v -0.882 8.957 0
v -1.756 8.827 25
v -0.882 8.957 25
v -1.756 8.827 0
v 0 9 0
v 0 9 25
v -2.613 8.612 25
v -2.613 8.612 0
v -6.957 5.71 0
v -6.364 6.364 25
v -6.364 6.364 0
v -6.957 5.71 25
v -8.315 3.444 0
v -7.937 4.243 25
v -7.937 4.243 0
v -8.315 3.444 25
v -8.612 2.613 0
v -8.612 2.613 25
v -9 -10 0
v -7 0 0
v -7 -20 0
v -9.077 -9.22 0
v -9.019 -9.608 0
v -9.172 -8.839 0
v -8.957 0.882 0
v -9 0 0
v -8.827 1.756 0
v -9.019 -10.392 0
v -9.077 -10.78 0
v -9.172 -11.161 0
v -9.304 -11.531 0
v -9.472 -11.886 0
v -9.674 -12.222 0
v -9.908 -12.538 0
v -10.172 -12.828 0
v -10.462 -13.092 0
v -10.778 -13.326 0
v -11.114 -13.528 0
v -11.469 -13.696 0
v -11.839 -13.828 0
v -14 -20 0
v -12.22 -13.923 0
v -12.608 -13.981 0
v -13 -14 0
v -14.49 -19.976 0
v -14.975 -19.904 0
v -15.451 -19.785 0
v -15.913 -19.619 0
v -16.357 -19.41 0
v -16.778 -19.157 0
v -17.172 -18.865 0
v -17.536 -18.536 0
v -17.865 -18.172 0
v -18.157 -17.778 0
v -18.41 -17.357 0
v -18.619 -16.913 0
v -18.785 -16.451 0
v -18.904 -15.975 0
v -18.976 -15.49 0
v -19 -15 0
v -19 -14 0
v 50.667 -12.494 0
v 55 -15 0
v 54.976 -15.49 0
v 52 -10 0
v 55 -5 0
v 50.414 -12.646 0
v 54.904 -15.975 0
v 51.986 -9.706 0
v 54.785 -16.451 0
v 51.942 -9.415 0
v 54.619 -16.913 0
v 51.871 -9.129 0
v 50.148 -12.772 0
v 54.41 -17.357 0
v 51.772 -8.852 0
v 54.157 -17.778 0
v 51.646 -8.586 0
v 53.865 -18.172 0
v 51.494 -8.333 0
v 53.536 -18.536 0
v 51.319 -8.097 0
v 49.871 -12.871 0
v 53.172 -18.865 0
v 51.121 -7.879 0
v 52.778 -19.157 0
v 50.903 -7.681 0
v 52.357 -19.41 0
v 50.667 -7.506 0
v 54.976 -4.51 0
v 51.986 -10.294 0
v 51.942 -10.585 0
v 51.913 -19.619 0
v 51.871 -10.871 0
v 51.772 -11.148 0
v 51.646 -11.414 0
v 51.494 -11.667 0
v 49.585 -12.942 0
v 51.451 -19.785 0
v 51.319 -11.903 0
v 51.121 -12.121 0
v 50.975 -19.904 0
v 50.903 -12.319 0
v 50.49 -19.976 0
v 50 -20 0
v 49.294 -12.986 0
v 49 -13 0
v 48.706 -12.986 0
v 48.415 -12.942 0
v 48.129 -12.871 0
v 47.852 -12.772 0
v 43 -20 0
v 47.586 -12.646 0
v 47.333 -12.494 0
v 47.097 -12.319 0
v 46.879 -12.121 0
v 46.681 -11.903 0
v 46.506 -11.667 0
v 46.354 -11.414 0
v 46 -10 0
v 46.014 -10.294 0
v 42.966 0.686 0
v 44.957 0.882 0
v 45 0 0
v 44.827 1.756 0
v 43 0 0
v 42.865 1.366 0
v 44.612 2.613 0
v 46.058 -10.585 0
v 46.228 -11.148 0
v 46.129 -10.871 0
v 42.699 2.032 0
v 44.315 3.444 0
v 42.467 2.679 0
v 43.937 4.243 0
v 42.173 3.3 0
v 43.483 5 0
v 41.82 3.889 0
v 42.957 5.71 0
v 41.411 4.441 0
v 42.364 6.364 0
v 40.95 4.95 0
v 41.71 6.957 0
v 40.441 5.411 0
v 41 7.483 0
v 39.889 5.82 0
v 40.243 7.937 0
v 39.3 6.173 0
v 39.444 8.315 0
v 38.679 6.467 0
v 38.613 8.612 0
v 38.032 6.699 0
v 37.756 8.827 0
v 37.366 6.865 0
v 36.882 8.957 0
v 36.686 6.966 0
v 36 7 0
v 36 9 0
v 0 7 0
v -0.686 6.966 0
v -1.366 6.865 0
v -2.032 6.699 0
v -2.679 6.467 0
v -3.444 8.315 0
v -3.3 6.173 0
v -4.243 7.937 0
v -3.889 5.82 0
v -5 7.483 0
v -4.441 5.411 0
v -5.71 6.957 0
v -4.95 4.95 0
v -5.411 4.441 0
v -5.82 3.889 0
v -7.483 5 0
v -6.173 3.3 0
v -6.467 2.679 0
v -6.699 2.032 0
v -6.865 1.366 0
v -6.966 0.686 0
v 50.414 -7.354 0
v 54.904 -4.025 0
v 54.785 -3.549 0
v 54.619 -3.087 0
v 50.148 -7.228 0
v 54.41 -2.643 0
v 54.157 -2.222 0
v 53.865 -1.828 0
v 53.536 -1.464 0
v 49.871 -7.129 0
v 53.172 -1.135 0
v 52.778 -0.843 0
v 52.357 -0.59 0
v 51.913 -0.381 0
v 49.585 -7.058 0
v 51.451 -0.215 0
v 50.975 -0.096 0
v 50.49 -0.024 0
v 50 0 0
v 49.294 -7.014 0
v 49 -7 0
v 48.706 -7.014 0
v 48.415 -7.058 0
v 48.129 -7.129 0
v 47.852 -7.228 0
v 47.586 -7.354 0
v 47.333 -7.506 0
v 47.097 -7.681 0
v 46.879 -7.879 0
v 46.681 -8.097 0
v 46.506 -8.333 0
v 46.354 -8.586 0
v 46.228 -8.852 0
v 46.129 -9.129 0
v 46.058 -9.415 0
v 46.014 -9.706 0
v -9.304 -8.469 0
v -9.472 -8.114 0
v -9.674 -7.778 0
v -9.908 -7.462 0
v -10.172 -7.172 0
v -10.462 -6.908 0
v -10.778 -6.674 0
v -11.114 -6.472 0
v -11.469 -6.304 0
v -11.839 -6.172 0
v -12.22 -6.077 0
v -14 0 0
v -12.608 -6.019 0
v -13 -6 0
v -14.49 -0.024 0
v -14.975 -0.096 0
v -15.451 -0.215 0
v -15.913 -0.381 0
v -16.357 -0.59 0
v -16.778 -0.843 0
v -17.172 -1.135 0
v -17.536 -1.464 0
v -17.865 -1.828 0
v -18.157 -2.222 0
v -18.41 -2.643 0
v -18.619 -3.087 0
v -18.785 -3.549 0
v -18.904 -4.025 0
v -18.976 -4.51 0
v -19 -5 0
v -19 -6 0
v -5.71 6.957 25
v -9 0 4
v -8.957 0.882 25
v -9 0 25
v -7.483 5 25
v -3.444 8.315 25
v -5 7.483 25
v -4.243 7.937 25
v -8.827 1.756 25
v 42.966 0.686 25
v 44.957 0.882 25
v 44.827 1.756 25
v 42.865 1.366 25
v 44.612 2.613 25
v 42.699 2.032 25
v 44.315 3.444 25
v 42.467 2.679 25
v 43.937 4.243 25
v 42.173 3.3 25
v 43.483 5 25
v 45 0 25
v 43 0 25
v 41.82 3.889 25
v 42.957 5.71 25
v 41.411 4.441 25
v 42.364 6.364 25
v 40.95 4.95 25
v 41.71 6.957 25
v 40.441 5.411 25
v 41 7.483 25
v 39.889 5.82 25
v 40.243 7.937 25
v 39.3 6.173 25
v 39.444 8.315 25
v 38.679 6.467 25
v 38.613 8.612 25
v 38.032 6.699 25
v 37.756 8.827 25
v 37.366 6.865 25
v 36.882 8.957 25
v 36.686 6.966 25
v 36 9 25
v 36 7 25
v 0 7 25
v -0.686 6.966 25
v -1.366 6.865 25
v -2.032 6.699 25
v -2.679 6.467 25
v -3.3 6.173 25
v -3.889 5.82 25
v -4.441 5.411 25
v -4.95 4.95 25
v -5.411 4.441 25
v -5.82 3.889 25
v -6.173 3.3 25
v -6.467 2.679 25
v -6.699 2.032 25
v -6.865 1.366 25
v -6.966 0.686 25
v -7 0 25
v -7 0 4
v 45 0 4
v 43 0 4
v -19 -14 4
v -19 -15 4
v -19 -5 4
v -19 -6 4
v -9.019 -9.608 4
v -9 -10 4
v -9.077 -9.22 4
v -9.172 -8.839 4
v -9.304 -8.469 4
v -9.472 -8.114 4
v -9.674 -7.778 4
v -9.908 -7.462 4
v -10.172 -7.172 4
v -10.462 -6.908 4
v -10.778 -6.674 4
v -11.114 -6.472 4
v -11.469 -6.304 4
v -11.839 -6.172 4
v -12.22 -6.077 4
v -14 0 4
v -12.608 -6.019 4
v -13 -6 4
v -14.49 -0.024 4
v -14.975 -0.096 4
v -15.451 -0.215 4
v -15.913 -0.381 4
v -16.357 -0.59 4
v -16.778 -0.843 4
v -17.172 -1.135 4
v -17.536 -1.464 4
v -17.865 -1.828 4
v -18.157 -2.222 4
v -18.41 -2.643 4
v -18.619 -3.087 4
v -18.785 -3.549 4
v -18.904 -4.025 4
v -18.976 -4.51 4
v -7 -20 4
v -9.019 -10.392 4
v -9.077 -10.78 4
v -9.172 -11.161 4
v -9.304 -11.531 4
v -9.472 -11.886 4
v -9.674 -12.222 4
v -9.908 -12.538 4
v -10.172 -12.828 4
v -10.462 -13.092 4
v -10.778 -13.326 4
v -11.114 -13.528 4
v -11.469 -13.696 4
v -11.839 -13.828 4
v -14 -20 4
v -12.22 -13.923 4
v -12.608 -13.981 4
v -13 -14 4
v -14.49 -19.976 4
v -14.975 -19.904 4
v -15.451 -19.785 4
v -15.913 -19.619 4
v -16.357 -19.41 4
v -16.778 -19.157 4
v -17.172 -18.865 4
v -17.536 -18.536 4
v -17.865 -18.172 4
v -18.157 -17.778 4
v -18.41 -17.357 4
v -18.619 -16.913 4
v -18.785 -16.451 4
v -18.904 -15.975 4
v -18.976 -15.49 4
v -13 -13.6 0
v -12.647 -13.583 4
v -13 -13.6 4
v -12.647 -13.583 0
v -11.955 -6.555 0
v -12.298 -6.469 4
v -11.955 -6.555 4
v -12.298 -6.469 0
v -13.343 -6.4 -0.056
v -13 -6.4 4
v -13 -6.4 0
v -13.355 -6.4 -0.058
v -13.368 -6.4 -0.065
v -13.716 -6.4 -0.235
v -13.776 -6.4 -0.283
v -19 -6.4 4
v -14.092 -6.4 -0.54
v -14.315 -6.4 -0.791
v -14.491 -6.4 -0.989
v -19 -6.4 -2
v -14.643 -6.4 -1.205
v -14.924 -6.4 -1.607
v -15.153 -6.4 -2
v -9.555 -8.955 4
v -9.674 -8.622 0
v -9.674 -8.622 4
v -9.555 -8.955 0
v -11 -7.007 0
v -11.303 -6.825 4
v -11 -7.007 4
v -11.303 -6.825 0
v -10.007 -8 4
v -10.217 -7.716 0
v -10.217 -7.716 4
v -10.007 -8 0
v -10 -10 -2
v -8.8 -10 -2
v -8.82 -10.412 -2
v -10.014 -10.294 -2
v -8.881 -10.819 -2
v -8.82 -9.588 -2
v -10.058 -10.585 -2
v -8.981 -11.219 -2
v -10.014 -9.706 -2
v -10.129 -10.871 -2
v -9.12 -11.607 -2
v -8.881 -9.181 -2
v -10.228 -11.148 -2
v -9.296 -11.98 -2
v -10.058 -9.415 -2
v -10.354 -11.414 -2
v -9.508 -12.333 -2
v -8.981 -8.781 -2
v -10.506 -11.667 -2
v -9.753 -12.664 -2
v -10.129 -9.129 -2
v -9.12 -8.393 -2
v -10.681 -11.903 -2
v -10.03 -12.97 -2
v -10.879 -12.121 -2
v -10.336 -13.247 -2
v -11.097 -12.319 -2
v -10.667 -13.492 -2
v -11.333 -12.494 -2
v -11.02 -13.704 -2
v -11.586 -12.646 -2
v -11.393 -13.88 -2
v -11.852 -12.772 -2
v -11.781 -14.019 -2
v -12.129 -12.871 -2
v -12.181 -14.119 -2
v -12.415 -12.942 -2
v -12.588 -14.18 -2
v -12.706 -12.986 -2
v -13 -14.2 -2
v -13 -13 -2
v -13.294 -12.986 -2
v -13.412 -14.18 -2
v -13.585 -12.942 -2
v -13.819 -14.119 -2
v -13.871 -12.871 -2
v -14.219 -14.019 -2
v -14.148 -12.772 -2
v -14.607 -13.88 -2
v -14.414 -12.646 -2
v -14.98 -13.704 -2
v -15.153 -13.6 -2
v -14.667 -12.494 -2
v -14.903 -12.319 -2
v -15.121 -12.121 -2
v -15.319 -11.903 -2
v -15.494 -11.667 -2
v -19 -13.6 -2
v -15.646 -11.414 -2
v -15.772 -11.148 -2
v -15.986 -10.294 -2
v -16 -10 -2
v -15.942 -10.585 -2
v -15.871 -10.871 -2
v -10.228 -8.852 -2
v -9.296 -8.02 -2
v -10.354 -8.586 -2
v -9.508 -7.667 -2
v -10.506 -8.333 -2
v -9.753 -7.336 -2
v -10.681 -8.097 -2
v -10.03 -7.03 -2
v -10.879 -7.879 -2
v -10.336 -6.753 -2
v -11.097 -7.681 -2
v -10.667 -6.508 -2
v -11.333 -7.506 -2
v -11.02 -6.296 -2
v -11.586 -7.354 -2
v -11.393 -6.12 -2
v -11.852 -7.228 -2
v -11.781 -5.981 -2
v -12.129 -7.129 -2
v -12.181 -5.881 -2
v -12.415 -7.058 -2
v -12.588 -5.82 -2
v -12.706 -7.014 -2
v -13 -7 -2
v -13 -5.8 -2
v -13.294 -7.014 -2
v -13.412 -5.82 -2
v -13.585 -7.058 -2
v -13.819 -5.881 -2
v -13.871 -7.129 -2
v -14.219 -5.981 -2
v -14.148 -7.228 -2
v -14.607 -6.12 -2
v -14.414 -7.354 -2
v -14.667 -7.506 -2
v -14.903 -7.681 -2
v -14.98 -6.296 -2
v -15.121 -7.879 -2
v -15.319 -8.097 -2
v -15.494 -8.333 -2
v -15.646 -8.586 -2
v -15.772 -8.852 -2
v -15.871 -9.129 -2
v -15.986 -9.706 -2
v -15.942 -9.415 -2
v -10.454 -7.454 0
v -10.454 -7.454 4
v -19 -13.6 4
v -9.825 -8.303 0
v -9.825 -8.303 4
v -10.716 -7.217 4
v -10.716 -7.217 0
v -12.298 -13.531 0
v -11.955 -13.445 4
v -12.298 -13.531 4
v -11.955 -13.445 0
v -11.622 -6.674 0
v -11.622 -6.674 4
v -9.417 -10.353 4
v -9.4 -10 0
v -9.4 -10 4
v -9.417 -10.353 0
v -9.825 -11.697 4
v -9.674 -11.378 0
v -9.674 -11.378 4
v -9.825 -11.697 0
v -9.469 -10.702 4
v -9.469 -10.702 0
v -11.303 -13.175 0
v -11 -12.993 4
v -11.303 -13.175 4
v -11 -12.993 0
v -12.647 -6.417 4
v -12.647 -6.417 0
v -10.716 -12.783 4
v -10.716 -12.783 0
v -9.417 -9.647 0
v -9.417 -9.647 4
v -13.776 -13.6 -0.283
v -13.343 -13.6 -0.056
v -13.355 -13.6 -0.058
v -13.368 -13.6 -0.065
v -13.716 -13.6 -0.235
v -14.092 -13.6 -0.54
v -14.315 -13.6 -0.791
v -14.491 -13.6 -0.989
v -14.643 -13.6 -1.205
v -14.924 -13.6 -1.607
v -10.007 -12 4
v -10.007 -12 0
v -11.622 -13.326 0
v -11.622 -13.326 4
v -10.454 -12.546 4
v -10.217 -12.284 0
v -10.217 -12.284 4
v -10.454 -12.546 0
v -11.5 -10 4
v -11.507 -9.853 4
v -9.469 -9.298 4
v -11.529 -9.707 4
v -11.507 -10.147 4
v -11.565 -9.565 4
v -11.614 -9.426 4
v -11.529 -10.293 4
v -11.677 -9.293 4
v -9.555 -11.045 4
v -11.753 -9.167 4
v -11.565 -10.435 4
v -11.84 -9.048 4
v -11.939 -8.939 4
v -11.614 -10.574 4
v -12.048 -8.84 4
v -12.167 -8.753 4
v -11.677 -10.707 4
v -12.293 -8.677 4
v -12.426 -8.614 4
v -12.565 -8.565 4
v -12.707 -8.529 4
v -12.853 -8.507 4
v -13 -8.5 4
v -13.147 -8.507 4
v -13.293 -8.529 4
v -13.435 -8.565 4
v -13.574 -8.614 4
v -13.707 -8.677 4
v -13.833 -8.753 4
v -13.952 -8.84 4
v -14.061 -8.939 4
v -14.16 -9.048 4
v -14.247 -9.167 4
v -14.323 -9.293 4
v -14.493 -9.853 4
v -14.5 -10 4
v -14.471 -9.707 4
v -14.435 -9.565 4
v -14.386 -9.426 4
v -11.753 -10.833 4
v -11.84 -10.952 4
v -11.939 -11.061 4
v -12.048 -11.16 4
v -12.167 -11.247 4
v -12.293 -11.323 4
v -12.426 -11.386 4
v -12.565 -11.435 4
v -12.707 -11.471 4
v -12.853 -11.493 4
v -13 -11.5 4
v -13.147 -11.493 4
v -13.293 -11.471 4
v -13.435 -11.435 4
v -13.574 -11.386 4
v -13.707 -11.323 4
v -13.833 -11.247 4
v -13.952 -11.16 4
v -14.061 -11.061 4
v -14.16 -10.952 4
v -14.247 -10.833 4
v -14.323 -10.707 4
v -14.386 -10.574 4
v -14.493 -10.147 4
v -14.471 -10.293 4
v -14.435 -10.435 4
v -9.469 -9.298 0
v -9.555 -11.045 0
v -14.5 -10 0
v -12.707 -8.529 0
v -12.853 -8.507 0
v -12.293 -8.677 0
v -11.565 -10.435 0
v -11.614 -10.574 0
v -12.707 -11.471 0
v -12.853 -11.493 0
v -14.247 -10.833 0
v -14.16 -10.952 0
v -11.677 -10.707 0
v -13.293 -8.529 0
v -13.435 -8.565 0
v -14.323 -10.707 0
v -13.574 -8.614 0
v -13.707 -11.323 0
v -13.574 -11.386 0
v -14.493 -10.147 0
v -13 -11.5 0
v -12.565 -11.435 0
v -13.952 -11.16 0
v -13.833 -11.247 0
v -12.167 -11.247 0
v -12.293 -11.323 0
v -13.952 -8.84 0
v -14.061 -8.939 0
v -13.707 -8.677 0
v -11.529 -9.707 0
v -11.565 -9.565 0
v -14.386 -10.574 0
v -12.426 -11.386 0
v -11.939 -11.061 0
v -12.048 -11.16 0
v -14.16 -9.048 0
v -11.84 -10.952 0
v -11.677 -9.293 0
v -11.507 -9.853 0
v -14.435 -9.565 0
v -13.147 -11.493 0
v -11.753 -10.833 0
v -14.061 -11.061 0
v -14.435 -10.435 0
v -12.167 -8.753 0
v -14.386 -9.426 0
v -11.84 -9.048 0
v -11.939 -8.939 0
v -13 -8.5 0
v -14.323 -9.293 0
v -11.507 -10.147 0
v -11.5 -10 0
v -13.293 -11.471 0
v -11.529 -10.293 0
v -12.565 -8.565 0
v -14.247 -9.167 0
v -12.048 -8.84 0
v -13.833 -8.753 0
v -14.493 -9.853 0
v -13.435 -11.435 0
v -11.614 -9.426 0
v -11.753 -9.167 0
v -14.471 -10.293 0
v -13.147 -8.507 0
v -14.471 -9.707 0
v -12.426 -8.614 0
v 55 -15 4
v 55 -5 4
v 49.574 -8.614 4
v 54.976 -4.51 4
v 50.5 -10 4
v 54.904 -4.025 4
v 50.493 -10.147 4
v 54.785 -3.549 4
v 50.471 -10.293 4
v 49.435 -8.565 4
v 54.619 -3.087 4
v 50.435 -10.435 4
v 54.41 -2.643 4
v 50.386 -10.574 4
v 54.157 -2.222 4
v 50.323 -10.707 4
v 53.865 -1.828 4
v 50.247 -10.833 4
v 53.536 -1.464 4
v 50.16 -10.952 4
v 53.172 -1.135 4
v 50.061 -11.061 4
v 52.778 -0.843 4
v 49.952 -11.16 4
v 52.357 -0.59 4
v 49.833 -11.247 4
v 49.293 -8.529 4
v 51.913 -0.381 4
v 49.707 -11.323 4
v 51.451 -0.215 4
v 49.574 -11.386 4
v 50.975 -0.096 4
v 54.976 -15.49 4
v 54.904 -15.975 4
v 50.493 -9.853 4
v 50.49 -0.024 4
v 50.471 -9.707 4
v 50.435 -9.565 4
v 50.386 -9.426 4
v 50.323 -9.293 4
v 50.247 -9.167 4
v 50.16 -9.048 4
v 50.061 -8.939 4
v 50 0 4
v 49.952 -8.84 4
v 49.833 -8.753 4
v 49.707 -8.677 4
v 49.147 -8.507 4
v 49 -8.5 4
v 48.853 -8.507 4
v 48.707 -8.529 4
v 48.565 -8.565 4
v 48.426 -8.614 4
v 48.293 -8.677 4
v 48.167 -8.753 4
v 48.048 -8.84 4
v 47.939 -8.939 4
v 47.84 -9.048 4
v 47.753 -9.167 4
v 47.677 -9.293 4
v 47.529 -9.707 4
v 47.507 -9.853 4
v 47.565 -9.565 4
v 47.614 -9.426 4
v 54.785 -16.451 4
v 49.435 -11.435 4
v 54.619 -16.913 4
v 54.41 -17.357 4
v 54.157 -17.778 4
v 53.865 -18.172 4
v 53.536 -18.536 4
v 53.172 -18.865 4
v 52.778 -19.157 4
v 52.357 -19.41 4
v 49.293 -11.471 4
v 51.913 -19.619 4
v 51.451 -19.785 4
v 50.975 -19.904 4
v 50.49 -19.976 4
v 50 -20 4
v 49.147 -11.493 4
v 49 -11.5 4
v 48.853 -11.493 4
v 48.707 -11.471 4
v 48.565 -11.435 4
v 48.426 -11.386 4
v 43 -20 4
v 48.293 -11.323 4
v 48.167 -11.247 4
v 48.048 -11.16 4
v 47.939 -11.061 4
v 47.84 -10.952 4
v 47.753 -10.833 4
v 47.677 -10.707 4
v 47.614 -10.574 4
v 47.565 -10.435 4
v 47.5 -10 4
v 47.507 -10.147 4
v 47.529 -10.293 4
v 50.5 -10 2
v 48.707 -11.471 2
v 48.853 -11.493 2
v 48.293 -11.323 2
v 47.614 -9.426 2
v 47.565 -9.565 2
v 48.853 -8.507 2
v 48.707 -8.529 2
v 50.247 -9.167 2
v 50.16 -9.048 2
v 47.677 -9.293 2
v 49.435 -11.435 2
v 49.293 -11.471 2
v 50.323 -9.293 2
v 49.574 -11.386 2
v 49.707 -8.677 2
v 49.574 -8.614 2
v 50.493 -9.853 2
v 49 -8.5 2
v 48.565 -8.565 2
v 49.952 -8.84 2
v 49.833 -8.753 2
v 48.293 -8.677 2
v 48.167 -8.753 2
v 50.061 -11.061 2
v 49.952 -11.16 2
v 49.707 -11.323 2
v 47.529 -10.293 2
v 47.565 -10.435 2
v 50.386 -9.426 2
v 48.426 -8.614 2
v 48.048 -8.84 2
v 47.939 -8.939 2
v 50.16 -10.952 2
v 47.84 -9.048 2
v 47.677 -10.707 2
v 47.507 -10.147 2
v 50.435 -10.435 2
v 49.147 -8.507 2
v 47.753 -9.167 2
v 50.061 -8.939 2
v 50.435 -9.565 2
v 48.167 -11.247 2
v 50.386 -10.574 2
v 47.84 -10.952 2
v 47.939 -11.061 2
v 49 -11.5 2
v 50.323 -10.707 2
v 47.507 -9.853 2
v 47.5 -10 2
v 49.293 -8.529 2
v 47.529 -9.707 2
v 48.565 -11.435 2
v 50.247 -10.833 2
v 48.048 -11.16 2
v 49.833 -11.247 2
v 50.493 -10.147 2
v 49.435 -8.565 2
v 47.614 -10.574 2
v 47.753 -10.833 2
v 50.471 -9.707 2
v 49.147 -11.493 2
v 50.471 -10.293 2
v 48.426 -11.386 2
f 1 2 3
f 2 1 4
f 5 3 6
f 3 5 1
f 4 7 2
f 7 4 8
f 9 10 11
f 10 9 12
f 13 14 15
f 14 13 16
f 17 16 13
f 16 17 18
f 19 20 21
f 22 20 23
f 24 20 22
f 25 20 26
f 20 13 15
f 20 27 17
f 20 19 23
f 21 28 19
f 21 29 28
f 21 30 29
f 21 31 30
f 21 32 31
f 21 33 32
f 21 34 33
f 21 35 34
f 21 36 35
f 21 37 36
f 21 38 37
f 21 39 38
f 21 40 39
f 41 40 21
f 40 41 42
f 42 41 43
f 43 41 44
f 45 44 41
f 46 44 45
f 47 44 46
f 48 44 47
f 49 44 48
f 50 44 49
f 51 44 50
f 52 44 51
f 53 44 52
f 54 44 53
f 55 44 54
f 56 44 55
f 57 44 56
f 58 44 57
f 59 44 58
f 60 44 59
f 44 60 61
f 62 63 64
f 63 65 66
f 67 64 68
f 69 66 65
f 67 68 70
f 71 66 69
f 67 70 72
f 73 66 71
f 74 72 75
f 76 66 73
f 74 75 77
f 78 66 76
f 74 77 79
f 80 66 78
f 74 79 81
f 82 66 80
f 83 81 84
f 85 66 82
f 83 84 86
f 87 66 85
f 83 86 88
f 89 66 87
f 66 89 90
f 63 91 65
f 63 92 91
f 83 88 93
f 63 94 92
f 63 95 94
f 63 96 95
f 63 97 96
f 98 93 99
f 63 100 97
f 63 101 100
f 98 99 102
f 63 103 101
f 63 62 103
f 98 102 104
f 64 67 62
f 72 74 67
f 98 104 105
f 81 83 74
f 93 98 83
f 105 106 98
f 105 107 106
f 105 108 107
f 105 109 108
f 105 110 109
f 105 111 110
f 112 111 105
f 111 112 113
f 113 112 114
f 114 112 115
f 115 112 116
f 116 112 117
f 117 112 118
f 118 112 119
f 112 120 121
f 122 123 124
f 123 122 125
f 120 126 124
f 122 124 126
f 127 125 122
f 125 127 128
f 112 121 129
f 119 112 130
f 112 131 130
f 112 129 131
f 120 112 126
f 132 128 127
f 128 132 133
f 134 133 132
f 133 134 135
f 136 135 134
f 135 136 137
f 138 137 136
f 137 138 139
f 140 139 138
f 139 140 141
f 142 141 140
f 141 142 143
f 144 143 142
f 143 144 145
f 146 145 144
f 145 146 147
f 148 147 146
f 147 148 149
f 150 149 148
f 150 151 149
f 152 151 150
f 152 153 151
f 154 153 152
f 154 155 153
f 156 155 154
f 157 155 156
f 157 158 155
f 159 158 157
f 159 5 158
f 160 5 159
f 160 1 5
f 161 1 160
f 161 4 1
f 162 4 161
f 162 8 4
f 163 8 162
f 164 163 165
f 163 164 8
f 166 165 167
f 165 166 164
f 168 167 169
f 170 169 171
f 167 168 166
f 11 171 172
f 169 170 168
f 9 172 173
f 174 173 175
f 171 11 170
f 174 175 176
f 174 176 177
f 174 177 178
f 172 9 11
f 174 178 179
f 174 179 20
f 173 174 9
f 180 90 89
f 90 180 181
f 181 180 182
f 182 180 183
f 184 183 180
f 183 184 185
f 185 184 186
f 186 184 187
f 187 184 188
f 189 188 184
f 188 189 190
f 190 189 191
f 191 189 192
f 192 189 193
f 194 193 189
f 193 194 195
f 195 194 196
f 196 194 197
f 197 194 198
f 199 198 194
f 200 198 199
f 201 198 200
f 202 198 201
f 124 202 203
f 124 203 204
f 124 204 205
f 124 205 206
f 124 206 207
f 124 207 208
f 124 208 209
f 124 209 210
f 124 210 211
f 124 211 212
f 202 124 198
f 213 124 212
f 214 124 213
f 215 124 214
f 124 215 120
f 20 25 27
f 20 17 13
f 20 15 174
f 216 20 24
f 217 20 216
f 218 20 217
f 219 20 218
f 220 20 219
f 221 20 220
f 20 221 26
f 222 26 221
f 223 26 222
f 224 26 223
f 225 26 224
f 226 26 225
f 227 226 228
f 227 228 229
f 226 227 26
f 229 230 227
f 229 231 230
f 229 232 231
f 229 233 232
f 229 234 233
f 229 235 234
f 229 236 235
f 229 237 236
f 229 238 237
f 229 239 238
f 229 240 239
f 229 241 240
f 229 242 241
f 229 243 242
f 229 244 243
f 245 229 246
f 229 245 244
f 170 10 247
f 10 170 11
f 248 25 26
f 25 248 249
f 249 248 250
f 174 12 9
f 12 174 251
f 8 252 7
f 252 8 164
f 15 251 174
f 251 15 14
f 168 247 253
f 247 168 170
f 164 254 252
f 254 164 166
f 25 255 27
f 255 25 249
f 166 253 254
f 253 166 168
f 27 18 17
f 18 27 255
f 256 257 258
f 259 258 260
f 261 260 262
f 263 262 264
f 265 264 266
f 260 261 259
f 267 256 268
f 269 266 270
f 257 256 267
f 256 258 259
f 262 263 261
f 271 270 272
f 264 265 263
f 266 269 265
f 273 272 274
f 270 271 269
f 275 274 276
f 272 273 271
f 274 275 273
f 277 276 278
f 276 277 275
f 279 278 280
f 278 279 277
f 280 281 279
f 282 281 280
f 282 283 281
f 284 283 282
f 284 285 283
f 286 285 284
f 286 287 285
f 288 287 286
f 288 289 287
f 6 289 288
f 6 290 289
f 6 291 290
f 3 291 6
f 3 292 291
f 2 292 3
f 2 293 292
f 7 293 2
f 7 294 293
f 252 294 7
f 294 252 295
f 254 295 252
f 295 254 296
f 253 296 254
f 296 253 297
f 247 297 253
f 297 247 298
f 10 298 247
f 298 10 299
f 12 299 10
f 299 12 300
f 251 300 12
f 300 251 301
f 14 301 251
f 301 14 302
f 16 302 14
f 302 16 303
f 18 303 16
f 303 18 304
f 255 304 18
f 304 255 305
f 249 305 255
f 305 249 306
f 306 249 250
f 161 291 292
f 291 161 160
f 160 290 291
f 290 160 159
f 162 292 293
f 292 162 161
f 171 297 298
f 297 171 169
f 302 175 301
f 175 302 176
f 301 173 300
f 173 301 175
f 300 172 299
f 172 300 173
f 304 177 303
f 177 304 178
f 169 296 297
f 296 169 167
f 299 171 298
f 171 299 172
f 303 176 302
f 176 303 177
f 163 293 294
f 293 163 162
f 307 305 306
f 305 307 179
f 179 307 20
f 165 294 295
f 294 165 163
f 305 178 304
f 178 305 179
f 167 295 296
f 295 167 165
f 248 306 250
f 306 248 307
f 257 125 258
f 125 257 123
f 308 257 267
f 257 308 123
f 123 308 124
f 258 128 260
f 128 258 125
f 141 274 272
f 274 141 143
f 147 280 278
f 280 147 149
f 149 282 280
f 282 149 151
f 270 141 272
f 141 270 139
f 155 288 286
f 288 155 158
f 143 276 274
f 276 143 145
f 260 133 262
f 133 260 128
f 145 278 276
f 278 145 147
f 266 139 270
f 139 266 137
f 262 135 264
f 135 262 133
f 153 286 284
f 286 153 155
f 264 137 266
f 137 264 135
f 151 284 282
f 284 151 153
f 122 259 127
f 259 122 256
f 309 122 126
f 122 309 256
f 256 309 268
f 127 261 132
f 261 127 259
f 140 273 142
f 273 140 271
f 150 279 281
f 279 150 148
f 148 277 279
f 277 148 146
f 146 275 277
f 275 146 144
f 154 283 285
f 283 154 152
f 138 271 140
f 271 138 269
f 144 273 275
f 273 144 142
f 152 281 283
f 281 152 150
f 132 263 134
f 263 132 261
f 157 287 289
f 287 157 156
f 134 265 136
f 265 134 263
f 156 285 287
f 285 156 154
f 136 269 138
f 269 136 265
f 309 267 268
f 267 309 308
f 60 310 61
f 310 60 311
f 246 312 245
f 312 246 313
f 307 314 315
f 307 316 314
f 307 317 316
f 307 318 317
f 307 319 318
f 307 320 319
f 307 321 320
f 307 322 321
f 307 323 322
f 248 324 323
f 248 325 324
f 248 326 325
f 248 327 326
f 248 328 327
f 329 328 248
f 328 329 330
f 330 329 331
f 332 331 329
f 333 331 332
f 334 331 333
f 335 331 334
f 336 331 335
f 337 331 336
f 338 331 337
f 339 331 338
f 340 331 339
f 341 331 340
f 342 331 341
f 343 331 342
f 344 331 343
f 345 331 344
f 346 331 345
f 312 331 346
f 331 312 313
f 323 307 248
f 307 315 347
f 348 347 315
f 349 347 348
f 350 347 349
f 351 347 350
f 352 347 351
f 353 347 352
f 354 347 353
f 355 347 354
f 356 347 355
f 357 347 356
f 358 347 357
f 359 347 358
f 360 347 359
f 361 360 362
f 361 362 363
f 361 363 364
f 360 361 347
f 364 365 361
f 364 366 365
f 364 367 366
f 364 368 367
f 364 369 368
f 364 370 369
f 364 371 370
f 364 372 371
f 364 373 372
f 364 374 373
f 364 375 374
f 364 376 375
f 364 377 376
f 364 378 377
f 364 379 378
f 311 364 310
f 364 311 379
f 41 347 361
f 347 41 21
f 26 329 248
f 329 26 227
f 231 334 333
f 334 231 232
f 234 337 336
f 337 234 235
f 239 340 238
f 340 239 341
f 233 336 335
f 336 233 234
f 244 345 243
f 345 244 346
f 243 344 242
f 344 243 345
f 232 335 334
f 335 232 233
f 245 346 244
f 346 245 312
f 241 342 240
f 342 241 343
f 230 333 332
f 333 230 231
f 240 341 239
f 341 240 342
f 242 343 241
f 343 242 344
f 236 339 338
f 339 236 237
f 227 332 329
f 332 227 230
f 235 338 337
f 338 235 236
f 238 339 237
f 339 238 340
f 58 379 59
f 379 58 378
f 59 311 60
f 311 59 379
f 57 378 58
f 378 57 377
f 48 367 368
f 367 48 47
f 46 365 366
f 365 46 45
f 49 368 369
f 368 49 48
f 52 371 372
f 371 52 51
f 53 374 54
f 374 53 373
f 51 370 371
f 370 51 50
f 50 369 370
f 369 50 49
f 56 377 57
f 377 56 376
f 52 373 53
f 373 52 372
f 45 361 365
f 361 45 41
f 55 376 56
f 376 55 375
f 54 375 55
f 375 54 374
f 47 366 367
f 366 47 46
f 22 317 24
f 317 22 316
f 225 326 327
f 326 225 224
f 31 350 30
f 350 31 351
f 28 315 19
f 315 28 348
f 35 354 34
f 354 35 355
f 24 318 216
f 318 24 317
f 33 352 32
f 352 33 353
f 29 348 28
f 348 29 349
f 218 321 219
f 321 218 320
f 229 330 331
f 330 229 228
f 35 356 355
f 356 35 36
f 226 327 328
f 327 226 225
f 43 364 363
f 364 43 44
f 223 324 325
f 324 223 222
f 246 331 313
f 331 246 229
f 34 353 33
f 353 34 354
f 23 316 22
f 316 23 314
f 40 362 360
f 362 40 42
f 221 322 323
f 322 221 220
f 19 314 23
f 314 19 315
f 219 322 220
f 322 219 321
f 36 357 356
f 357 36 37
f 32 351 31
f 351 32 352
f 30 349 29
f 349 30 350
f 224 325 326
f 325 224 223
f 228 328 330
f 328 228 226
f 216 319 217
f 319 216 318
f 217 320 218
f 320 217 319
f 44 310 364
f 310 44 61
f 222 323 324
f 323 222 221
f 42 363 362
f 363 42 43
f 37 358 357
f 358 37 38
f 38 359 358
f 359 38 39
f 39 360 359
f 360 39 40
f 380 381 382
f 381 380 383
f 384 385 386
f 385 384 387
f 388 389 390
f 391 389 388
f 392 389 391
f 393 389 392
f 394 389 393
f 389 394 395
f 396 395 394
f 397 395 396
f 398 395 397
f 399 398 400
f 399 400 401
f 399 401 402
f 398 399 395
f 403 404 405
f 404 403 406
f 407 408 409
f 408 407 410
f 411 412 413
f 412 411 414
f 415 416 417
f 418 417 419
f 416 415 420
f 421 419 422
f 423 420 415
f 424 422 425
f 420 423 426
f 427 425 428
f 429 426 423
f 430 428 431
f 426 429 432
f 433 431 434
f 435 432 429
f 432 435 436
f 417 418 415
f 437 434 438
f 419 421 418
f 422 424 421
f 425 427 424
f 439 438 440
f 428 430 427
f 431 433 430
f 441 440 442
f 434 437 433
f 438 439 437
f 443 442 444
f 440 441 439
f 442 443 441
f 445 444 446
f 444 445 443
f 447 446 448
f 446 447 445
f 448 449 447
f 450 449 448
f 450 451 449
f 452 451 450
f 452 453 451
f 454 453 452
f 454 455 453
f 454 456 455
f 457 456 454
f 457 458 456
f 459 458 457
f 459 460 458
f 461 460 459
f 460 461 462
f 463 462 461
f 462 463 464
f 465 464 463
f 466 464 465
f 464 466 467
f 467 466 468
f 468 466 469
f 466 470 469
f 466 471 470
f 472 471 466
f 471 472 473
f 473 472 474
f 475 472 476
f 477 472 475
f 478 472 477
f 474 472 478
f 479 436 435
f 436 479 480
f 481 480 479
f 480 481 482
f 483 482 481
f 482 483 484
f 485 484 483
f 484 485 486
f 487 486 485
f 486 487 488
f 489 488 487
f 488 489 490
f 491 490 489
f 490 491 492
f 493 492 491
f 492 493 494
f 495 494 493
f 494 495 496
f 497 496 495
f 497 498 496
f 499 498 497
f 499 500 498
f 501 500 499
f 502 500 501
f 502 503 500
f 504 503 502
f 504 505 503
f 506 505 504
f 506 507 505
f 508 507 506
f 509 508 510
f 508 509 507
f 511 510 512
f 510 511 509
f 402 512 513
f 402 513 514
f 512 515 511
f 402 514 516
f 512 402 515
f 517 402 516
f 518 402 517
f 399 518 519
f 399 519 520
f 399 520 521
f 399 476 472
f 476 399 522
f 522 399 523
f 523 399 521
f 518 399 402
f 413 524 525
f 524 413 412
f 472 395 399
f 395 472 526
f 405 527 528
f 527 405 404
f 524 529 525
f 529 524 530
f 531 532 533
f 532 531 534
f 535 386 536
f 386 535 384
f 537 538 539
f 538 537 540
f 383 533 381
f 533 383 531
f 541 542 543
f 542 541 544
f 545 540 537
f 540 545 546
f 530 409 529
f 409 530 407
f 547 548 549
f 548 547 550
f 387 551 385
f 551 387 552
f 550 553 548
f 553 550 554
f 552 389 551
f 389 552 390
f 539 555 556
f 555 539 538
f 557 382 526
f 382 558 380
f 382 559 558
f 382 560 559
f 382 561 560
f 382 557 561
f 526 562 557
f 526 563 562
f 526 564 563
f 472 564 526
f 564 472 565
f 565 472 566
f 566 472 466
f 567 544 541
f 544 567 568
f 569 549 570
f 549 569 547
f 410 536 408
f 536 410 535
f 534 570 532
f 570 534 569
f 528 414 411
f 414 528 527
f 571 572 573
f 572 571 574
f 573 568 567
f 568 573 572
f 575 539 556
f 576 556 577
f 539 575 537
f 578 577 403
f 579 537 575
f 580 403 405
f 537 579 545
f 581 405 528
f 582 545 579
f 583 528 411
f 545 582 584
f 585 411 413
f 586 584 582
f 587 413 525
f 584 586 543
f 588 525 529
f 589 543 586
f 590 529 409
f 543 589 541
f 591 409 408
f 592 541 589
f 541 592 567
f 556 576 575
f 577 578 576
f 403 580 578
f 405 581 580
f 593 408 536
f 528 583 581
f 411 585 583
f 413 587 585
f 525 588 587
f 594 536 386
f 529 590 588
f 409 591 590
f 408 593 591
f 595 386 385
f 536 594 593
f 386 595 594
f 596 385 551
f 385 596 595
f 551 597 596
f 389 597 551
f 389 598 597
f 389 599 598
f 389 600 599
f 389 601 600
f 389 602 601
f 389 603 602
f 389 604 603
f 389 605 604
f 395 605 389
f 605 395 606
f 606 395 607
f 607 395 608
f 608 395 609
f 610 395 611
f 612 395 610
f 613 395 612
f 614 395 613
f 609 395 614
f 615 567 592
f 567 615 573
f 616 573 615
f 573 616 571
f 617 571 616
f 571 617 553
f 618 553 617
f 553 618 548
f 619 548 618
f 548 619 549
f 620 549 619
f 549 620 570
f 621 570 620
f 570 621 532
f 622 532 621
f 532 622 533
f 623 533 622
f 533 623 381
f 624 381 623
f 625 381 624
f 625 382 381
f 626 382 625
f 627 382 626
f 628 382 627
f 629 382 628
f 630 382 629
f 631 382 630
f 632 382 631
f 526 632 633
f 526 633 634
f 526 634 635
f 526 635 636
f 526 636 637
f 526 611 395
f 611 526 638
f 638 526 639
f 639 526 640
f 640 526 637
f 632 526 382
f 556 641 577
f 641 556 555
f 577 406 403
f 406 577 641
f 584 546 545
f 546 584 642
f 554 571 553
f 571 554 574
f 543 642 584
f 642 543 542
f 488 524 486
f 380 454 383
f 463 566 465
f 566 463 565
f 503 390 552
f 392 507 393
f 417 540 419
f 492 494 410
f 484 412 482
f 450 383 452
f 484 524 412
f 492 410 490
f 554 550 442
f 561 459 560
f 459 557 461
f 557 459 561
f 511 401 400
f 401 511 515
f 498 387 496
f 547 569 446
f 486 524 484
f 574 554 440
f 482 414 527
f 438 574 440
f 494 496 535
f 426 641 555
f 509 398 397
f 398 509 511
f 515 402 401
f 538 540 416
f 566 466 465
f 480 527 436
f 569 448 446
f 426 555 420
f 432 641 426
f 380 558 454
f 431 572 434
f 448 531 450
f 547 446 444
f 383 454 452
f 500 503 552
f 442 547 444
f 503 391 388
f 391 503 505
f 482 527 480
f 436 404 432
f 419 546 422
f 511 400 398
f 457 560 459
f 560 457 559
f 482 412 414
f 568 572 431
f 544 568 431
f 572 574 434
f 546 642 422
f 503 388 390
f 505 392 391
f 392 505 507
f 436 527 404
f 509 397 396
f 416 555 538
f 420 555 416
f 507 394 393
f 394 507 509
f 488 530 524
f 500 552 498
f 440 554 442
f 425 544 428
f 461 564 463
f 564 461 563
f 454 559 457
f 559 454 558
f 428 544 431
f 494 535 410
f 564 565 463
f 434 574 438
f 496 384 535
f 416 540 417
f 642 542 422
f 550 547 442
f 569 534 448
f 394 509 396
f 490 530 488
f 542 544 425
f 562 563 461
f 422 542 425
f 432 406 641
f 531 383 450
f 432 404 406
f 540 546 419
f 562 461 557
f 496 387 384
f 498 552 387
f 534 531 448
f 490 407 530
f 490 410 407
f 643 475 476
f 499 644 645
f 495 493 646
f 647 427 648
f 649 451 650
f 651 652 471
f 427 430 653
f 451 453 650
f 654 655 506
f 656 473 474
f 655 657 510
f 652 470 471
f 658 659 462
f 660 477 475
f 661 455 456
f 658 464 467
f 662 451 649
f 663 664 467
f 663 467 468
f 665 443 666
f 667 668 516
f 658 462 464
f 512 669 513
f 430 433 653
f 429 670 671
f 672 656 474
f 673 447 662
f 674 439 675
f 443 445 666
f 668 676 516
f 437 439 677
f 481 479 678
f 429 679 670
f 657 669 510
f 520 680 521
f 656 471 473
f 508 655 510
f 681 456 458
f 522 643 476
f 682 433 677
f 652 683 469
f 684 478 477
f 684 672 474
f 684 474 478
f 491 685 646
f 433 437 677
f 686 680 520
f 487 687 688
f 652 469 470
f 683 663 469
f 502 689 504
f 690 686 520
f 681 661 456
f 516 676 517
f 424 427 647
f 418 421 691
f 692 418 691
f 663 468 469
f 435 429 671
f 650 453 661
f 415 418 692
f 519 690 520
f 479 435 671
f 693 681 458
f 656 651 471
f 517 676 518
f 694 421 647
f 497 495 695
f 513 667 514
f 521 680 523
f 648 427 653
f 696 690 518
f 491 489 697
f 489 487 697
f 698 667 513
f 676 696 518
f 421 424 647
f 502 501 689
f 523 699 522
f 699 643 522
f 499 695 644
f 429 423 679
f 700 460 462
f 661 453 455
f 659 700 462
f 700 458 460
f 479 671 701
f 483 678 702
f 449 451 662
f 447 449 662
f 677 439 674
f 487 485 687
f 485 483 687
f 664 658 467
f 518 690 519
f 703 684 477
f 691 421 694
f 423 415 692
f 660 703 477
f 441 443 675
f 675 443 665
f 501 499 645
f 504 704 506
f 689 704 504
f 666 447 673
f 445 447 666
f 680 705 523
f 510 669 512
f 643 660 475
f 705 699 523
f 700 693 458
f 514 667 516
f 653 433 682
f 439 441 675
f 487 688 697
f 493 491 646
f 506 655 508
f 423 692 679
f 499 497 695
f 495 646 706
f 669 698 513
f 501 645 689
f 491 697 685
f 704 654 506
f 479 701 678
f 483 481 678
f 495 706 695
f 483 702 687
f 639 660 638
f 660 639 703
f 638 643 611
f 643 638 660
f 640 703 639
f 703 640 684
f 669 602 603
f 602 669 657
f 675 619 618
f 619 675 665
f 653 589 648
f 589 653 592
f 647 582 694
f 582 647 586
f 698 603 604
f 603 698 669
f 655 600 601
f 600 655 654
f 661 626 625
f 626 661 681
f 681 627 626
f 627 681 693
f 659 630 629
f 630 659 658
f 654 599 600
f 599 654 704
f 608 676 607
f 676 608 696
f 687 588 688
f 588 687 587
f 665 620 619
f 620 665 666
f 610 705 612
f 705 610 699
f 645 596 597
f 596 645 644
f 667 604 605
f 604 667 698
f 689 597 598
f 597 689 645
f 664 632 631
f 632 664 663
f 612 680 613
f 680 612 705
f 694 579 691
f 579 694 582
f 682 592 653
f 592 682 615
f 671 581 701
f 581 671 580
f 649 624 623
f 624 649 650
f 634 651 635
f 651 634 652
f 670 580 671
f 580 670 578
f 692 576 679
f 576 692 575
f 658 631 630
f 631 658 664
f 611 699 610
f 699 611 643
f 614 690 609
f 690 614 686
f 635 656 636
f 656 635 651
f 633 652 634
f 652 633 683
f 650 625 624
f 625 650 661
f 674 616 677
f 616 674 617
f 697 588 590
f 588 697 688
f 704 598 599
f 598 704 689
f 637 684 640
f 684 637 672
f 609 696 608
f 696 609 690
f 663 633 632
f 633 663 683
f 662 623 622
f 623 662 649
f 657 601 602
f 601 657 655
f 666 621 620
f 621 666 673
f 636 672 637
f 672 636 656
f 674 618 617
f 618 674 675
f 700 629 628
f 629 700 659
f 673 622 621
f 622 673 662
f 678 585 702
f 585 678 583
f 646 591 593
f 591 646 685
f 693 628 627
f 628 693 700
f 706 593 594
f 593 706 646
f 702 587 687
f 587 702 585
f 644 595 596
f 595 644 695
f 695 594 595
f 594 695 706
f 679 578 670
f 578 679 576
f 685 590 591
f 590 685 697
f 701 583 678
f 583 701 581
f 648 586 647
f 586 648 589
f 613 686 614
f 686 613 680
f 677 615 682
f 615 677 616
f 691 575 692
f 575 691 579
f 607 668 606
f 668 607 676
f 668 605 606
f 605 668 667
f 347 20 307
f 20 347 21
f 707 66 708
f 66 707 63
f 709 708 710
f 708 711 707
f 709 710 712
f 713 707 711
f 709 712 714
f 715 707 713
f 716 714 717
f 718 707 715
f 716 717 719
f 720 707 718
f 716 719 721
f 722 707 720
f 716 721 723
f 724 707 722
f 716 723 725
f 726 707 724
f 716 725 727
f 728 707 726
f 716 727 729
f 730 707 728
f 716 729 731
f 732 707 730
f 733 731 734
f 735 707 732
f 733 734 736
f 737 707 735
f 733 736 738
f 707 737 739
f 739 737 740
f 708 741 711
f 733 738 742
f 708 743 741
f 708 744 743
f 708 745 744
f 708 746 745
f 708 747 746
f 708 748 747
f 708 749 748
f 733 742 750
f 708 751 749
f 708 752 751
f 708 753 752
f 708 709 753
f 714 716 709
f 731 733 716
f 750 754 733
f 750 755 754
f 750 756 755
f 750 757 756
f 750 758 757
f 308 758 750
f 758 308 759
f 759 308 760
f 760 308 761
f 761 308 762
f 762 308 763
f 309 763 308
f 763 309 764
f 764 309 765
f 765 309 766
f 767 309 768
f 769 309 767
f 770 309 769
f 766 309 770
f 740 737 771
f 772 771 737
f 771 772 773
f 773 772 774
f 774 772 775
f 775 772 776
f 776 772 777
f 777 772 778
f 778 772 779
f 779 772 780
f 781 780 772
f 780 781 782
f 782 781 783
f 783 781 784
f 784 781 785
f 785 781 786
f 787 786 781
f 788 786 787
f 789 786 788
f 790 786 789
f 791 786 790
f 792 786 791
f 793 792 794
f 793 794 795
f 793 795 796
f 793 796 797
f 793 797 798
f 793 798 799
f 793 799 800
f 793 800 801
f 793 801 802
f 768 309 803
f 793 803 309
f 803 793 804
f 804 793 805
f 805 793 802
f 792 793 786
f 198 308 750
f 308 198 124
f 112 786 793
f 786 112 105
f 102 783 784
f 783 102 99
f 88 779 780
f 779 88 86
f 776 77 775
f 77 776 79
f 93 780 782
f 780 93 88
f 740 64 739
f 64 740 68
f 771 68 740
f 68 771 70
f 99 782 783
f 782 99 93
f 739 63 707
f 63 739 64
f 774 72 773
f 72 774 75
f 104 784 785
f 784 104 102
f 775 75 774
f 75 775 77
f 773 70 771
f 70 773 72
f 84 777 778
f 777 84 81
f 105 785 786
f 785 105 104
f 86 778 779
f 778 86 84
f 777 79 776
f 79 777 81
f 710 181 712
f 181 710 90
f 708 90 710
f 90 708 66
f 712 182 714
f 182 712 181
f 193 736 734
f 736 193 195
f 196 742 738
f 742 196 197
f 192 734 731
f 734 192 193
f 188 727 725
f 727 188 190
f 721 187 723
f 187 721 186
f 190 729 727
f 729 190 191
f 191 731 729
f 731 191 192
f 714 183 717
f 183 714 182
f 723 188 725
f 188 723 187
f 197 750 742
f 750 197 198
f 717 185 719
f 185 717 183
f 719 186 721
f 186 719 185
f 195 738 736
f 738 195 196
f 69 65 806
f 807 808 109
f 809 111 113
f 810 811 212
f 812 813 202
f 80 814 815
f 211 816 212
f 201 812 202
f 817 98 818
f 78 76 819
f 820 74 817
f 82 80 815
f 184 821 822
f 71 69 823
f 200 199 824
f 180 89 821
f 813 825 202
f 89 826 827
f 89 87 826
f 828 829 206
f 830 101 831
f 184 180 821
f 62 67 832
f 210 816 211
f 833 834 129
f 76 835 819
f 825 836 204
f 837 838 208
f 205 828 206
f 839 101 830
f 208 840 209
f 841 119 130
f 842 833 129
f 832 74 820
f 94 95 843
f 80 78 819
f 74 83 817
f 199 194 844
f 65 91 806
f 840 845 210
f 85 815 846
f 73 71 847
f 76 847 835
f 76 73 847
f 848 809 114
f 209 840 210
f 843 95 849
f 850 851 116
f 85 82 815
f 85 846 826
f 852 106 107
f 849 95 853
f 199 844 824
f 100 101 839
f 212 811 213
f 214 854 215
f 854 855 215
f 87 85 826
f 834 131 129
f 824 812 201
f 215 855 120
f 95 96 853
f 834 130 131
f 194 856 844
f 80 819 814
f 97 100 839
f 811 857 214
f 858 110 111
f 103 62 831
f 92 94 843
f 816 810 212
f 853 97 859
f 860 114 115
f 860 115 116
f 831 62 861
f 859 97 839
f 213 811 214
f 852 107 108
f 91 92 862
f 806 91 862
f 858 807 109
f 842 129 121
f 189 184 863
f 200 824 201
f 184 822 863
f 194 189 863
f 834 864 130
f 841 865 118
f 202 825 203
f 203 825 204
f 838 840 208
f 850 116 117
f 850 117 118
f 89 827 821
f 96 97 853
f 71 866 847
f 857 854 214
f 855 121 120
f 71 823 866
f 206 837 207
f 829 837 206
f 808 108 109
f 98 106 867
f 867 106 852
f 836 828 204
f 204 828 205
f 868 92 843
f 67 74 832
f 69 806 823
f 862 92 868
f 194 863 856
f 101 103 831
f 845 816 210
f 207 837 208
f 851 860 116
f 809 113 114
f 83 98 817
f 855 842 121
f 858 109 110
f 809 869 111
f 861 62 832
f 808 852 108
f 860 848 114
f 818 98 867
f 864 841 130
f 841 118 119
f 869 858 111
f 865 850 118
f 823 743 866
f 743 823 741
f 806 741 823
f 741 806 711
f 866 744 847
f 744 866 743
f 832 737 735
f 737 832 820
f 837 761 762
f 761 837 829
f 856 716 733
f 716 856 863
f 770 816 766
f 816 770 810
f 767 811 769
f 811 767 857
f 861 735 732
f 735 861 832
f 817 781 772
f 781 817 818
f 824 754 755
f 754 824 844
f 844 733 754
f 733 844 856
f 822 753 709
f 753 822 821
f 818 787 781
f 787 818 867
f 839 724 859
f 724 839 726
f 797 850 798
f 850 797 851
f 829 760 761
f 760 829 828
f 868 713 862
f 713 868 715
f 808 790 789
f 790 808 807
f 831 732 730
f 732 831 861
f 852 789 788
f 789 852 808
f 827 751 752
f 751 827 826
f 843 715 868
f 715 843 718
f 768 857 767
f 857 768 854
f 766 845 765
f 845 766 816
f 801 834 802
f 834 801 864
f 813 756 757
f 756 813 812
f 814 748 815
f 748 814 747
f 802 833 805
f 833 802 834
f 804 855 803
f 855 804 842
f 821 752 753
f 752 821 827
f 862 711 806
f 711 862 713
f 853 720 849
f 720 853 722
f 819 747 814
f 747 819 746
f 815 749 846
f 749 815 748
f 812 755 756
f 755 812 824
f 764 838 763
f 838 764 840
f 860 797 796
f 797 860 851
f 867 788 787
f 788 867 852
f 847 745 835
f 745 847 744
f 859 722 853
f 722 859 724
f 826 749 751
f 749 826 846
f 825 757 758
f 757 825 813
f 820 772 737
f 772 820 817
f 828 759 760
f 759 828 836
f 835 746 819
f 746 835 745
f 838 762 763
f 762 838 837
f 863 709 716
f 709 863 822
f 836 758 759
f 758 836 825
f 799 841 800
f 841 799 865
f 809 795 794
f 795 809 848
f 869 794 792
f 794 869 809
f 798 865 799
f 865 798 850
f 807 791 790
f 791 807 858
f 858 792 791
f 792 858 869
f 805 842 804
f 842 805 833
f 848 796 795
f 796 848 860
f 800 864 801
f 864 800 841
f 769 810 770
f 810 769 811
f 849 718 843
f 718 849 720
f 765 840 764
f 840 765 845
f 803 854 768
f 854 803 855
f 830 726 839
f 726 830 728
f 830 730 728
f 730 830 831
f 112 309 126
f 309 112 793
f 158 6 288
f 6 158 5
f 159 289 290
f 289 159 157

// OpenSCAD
// translate([20, 0, 0]) import("./cable_management_clip.stl");

$fn = 64;

additional_thingy = true;

inner_curve = 7;
thickness = 2;
screw_thickness = 5;
height = 25;
bot_height = 4;
depth = 10;
real_length = 50;
length = real_length - (2 * inner_curve);
clip_r = 1.5;

module corner(type = 0, r = 5) {
  angle = 90 * -type;
  rotate([0, 0, angle]) {
    intersection() {
      difference() {
        cylinder(h = height, r = r + thickness);
        cylinder(h = height, r = r);
      }
      cube(height, 7, 7);
    }
  }
}

module screw_base(size_x = 20, size_y = 10) {
  difference() {
    intersection() {
      union() {
        translate([0, size_y / 2, 0]) {
          cube([size_y, size_x - size_y, bot_height]);
        }
        translate([-size_y / 2, 0, 0]) {
          cube([size_y, size_x, bot_height]);
        }
        translate([size_y / 2, size_y / 2, 0]) {
          cylinder(h = bot_height, r = size_y / 2);
        }
        translate([size_y / 2, size_y * 1.5, 0]) {
          cylinder(h = bot_height, r = size_y / 2);
        }
      }
      cube([size_y, size_x, bot_height]);
    }

    translate([4, size_x / 2, 0]) {
      cylinder(h = 2, r2 = 1.5, r1 = 3, center = false);
      cylinder(h = bot_height + thickness + thickness, r = 1.5, center = false);
    }
  }

  translate([-thickness, 0, 0]) {
    cube([thickness, size_x, bot_height]);
  }
}

module screw_base_clip(size_x = 20, size_y = 10) {
  module xxx(rrr = 3.6) {
    translate([4, size_x / 2, 0]) {
      hull() {
        cylinder(h = bot_height, r = rrr);
        translate([size_y / 2 - 4, -rrr, -thickness]) {
          cube([5, rrr * 2, bot_height + thickness]);
        }
      }
      translate([0, 0, -thickness]) cylinder(h = thickness, r2 = rrr, r1 = rrr + 0.6);
    }
  }

  difference() {
    intersection() {
      union() {
        translate([0, size_y / 2, 0]) {
          cube([size_y, size_x - size_y, bot_height]);
        }
        translate([-size_y / 2, 0, 0]) {
          cube([size_y, size_x, bot_height]);
        }
        translate([size_y / 2, size_y / 2, 0]) {
          cylinder(h = bot_height, r = size_y / 2);
        }
        translate([size_y / 2, size_y * 1.5, 0]) {
          cylinder(h = bot_height, r = size_y / 2);
        }
      }
      cube([size_y, size_x, bot_height]);
    }

    xxx(rrr = 4);
  }
  difference() {
    xxx(rrr = 3.6);
    translate([4, size_x / 2, -thickness]) {
      cylinder(h = 2, r2 = 1.5, r1 = 3, center = false);
      cylinder(h = bot_height + thickness + thickness, r = 1.5, center = false);
    }
  }

  translate([-thickness, 0, 0]) {
    cube([thickness, size_x, bot_height]);
  }
}

corner(3, r = inner_curve);
translate([0, inner_curve, 0]) {
  cube([length, thickness, height]);
}
translate([length, 0, 0]) {
  corner(0, r = inner_curve);
}
translate([-inner_curve - thickness, -depth, 0]) {
  cube([thickness, depth, bot_height]);
}
translate([inner_curve + length, -depth, 0]) {
  cube([thickness, depth, bot_height]);
}
translate([-inner_curve - thickness, 0, 0]) rotate(180, [0, 0, 1]) screw_base_clip();
translate([length + inner_curve + thickness, -20, 0]) screw_base();
